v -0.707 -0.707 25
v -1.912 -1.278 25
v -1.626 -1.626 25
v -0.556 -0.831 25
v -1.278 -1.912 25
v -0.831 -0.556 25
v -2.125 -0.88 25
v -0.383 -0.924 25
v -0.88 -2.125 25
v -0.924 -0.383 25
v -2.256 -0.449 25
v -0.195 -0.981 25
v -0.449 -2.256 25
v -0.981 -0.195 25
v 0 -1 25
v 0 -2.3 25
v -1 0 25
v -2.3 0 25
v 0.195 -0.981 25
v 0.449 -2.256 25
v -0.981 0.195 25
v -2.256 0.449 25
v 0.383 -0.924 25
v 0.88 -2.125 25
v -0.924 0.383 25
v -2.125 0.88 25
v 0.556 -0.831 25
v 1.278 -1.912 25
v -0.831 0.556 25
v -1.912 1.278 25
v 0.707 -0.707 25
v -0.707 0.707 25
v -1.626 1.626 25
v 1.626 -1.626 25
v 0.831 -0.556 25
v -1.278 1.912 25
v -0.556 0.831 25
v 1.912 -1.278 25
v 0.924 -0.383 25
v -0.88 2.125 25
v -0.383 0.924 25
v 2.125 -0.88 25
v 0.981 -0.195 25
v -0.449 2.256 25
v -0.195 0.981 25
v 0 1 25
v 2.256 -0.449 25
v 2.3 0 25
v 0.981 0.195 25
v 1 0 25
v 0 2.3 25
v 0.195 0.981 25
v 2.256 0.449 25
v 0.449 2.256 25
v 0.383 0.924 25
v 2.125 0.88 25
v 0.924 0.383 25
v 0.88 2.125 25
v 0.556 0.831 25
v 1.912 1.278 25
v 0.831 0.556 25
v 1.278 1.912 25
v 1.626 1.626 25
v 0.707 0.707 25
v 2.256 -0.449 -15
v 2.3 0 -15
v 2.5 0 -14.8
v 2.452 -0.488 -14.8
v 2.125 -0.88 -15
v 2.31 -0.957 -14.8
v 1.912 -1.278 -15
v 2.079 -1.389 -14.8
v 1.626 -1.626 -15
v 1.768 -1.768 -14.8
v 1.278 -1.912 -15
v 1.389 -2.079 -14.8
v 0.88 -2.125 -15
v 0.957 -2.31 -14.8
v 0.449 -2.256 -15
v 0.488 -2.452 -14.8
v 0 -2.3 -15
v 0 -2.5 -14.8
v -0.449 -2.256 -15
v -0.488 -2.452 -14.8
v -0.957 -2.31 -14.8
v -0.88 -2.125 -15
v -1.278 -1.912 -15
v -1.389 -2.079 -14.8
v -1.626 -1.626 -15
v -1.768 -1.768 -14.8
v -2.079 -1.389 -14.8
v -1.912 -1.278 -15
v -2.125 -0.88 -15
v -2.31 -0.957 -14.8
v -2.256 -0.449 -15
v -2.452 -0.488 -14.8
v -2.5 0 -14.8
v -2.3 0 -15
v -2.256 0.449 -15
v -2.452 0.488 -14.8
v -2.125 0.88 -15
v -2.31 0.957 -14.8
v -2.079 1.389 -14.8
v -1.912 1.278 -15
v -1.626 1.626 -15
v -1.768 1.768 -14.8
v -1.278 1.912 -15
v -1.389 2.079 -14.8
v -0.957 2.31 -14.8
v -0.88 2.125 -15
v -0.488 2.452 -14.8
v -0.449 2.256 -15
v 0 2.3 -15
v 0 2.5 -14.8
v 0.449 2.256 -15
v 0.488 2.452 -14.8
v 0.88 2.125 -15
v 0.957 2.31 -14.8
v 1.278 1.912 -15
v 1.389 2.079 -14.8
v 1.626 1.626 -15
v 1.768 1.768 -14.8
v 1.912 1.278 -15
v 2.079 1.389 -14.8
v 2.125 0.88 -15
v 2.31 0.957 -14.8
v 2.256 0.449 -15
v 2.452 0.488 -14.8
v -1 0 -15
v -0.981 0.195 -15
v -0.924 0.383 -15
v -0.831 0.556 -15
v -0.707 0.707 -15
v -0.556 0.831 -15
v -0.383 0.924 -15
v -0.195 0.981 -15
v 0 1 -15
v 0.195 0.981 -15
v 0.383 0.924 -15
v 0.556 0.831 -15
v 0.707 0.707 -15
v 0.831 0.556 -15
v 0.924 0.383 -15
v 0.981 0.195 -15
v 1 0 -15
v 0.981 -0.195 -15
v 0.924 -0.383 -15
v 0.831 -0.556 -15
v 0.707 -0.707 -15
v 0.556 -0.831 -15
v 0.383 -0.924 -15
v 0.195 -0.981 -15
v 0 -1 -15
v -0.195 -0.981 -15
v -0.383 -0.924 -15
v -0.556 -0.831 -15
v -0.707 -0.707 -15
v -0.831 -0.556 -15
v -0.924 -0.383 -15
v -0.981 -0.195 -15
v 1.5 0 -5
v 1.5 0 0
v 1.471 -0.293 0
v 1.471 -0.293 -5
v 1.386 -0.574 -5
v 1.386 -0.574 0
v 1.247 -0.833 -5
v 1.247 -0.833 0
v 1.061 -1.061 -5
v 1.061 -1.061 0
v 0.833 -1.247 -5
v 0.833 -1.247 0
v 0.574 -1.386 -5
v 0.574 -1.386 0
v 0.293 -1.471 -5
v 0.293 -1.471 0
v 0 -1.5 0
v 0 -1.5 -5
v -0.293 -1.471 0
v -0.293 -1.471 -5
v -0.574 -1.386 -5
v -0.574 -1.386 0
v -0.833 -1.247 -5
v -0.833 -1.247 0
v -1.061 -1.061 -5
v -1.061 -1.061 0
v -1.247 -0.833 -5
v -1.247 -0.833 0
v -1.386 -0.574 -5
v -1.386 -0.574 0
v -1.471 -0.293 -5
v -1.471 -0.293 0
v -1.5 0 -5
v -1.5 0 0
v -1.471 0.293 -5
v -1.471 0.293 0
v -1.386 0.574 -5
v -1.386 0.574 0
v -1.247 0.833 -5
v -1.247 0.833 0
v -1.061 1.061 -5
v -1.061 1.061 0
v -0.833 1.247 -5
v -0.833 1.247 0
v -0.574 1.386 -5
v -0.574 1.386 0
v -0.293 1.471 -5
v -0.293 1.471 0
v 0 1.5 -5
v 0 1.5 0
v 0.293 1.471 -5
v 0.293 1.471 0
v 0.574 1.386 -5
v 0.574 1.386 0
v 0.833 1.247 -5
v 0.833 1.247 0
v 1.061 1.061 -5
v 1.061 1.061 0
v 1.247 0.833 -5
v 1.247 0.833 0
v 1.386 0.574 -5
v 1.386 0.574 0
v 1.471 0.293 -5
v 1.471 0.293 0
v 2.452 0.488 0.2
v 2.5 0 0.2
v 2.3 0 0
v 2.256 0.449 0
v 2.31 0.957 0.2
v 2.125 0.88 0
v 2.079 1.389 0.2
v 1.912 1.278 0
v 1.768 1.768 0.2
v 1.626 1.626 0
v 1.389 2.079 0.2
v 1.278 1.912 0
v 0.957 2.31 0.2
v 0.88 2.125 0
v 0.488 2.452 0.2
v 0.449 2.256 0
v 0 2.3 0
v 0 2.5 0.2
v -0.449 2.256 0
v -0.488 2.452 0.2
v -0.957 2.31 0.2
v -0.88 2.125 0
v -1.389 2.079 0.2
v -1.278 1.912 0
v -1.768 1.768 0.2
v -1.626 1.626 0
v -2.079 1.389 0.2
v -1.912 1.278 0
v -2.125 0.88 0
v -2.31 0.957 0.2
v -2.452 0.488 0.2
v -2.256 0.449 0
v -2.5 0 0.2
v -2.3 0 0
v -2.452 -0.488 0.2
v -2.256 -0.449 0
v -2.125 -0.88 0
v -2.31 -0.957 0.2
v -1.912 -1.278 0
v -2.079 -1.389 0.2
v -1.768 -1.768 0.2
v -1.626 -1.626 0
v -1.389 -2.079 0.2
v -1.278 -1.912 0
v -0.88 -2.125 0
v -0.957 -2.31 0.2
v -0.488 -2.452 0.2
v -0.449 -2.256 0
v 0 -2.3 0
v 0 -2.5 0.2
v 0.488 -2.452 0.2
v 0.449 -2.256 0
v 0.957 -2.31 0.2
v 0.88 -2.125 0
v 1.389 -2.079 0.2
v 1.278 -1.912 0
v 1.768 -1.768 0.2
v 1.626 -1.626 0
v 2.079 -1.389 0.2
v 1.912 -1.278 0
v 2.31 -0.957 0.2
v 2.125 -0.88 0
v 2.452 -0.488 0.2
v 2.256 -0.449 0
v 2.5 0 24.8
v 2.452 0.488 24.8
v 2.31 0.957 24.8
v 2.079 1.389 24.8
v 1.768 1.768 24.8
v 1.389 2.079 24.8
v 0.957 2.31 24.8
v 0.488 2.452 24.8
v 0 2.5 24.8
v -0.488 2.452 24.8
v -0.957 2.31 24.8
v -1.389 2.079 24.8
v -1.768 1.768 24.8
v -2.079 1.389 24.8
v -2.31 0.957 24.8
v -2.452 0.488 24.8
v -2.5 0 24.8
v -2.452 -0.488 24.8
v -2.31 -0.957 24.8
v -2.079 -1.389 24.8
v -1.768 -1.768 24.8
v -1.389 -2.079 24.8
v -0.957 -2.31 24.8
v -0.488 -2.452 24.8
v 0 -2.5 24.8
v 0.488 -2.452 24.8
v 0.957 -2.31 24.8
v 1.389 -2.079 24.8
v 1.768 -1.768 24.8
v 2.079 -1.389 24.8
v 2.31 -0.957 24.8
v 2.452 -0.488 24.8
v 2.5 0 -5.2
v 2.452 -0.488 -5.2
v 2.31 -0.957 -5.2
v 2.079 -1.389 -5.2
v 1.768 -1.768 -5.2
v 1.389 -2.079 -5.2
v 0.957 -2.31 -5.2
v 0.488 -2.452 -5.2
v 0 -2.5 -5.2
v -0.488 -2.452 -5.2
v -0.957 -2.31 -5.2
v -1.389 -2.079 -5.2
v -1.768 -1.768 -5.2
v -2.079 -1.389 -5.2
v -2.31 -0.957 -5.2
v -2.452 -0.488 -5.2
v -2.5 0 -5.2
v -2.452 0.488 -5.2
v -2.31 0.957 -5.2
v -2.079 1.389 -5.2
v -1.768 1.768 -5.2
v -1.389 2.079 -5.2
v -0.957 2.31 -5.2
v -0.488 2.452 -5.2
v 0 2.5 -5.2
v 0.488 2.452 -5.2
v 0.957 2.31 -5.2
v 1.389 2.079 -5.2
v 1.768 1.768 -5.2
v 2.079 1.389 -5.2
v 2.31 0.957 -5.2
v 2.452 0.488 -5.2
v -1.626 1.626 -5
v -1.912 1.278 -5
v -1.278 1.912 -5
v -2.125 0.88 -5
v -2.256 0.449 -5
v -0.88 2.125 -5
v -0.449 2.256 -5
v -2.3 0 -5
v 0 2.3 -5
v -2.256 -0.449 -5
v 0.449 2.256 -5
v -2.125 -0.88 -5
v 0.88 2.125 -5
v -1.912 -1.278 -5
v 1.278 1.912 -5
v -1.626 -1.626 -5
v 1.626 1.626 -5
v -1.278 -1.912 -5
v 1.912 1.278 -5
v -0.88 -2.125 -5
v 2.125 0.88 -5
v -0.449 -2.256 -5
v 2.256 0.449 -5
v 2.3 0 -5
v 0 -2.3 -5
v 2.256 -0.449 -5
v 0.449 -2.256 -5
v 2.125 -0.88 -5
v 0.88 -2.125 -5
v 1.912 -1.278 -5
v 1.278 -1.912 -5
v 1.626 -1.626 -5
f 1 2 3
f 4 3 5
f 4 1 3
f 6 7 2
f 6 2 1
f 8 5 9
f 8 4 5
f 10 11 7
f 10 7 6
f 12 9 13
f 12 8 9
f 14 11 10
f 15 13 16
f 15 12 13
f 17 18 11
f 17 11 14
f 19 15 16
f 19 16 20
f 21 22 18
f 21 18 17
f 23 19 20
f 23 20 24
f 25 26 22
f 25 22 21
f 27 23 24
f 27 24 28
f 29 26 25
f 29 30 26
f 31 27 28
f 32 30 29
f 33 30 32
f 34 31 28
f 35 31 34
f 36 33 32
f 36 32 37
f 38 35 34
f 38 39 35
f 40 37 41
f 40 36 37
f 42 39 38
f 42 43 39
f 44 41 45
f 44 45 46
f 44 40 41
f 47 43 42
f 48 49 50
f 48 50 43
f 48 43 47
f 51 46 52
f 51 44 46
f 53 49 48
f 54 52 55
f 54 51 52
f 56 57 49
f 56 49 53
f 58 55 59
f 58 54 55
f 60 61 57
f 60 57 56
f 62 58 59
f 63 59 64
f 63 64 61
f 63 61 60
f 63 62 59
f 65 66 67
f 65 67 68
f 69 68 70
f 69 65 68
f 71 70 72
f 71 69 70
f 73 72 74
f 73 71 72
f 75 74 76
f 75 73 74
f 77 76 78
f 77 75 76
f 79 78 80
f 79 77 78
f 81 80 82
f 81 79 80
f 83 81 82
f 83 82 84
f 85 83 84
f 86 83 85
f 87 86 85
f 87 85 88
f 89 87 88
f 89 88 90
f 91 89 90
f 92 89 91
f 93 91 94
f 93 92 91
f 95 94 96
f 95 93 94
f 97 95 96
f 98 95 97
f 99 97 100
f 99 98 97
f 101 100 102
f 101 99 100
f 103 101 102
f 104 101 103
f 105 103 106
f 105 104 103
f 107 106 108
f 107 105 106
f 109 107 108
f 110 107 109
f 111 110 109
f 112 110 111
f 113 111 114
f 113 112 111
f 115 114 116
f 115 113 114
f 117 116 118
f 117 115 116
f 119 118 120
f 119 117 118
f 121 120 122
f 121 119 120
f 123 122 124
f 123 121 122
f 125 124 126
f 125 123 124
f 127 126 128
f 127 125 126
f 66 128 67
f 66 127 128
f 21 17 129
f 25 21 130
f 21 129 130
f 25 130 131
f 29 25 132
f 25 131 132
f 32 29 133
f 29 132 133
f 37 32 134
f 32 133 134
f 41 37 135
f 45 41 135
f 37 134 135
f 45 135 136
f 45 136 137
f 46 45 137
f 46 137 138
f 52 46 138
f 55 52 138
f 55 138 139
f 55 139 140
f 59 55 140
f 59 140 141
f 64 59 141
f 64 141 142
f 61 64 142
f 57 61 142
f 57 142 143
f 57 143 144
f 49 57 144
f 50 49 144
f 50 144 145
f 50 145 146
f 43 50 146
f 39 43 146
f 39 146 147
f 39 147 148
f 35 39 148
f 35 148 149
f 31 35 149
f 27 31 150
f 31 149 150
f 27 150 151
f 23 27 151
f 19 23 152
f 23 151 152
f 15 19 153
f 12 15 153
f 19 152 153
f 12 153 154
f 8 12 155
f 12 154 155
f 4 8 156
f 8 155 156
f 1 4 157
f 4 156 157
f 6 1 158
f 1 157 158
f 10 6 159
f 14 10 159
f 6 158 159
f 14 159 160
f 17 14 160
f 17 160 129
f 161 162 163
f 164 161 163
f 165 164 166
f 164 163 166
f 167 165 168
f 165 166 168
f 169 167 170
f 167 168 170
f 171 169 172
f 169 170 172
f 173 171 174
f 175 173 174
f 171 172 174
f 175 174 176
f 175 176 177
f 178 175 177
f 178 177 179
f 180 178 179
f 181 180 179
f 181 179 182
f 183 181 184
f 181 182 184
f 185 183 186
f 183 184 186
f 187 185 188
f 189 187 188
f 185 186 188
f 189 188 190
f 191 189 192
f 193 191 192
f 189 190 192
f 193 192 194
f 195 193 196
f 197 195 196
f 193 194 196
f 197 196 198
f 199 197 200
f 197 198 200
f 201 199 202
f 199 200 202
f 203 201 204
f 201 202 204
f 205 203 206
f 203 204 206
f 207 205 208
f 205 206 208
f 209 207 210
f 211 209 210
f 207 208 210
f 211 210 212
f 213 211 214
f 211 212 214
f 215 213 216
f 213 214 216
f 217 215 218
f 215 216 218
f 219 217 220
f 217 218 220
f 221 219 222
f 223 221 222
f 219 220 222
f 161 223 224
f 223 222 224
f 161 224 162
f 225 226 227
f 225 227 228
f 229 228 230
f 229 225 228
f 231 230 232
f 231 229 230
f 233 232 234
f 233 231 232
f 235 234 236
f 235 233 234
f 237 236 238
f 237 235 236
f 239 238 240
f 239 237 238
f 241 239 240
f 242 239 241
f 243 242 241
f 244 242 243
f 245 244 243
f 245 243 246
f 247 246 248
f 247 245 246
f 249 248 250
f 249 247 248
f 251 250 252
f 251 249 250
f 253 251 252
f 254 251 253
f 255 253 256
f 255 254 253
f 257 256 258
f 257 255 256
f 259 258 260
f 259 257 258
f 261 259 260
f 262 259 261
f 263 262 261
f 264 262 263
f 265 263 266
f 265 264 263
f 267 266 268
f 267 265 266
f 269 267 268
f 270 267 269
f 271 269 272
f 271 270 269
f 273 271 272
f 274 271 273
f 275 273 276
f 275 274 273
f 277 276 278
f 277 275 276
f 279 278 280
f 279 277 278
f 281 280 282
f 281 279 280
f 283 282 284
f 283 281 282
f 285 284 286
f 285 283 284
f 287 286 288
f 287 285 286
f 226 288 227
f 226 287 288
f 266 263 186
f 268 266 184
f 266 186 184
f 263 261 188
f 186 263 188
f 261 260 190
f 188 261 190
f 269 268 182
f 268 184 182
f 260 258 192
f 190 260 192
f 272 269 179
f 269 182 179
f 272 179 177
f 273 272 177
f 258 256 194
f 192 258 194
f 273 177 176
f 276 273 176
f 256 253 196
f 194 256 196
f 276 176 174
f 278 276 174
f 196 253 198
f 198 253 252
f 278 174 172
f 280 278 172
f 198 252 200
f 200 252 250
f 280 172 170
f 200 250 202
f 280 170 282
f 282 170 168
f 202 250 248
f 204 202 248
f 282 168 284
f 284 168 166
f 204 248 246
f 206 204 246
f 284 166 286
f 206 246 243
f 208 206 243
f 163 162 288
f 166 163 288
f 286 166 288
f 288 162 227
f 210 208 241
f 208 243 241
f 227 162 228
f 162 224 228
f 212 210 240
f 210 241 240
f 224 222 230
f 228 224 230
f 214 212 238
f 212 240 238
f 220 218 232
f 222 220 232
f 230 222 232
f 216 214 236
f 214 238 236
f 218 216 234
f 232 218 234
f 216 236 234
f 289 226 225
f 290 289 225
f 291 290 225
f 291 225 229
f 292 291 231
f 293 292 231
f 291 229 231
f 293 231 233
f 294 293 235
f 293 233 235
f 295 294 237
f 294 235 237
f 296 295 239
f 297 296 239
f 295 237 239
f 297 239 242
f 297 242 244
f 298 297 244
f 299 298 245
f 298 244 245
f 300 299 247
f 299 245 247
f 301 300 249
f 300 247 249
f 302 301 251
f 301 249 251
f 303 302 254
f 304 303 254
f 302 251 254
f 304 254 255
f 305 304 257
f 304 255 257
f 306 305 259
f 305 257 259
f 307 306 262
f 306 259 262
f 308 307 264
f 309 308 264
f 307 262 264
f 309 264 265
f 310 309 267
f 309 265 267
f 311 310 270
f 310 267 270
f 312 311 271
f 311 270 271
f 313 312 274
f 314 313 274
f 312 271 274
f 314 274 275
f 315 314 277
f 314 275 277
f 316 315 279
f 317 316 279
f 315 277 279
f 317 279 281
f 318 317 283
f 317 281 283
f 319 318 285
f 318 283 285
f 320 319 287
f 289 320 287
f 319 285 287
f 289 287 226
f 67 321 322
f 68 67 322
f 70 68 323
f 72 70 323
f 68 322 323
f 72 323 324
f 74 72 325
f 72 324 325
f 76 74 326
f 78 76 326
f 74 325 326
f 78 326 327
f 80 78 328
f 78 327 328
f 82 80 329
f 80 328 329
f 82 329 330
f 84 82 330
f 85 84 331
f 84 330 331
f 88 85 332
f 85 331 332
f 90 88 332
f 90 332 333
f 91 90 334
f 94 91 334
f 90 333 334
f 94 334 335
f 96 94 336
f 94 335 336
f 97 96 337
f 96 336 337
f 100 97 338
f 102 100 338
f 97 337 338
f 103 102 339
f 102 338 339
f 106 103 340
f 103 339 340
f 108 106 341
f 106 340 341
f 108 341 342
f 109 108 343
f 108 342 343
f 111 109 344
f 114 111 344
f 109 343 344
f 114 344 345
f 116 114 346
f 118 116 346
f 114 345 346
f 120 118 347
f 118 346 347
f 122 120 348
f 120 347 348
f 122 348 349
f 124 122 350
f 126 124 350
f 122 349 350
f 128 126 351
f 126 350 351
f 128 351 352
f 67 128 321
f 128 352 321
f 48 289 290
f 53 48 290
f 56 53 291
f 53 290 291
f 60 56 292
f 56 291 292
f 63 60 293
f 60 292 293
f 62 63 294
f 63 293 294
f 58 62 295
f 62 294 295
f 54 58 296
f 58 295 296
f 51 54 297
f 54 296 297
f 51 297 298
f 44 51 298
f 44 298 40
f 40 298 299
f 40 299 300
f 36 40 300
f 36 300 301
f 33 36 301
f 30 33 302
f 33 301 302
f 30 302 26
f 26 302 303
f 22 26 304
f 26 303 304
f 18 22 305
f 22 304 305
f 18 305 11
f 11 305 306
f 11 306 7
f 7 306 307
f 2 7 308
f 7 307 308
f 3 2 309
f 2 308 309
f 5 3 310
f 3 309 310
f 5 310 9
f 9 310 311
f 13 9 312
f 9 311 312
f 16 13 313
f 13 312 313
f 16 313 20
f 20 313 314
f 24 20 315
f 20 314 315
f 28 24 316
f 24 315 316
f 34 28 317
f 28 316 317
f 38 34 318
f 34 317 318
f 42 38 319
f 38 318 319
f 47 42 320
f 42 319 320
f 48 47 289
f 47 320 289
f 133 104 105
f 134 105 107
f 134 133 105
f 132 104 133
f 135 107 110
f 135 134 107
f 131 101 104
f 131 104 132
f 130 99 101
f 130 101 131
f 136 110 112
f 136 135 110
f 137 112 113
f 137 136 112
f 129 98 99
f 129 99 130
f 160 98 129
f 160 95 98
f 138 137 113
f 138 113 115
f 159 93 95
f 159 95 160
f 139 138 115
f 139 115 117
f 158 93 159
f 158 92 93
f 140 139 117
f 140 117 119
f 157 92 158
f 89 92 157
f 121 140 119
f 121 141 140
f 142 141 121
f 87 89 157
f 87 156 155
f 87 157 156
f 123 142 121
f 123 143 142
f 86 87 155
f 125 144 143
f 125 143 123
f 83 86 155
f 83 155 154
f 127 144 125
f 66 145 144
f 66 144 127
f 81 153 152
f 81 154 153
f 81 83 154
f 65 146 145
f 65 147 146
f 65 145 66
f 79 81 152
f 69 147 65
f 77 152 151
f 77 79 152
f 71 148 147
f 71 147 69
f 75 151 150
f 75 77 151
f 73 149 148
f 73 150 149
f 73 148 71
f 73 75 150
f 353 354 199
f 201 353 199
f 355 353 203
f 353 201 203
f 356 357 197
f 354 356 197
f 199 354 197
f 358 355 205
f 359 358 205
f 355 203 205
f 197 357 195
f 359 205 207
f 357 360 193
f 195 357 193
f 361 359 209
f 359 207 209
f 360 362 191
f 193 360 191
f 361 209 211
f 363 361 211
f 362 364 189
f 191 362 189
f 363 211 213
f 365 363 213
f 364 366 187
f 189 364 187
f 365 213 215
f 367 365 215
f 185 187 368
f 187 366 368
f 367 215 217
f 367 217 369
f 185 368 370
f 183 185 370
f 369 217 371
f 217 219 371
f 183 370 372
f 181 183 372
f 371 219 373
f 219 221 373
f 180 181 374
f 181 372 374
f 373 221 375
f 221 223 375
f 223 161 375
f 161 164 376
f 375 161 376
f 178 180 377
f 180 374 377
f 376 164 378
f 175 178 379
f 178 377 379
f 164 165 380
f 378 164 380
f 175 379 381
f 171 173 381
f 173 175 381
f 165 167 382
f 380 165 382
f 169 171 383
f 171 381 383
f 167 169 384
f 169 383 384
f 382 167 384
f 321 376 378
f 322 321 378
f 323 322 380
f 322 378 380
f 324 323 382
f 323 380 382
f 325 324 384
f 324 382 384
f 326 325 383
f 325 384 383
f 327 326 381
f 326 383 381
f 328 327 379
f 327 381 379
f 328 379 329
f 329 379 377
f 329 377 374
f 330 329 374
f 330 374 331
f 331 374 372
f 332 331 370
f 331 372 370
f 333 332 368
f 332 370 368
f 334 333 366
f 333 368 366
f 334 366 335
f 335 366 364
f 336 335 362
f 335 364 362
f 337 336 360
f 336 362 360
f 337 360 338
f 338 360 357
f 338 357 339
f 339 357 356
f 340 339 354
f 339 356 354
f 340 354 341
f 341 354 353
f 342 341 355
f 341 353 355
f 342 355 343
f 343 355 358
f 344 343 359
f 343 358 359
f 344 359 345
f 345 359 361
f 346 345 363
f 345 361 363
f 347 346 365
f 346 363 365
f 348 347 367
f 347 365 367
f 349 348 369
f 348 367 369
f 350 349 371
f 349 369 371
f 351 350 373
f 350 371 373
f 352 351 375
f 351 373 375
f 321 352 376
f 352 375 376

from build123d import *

# Parameters (mm, degrees)
F0_R     = 2.5
F1_DEPTH = 25
F2_R     = 1.5
F3_DEPTH = 5
F4_R     = 2.5
F4_R_2   = 1.5
F5_DEPTH = 10
F7_D     = 2
F8_SIZE  = 0.2


with BuildPart() as f1:
    # F0 (on Top) → F1 (new body)
    with BuildSketch(Plane.XY):
        Circle(F0_R)
    extrude(amount=F1_DEPTH)

    # F2 (on face) → F3 (join)
    with BuildSketch(Plane(origin=(0, 0, 0), x_dir=(1, 0, 0), z_dir=(0, 0, -1))):
        Circle(F2_R)
    extrude(amount=F3_DEPTH)

    # F4 (on face) → F5 (join)
    with BuildSketch(Plane(origin=(0, 0, -5), x_dir=(1, 0, 0), z_dir=(0, 0, -1))):
        Circle(F4_R)
        Circle(F4_R_2, mode=Mode.SUBTRACT)
        Circle(F4_R_2)
    extrude(amount=F5_DEPTH)

    # F7 (through all)
    with Locations(Plane.XY.offset(25)):
        with Locations((0, 0)):
            Hole(F7_D / 2)

    # F8
    f8_edges = [f1.edges().sort_by_distance(p)[0] for p in [
        (-2.5, 0, 25),
        (-2.5, 0, -5),
        (-2.5, 0, -15),
        (-2.5, 0, 0),
    ]]
    chamfer(f8_edges, length=F8_SIZE)


solid = f1.part
